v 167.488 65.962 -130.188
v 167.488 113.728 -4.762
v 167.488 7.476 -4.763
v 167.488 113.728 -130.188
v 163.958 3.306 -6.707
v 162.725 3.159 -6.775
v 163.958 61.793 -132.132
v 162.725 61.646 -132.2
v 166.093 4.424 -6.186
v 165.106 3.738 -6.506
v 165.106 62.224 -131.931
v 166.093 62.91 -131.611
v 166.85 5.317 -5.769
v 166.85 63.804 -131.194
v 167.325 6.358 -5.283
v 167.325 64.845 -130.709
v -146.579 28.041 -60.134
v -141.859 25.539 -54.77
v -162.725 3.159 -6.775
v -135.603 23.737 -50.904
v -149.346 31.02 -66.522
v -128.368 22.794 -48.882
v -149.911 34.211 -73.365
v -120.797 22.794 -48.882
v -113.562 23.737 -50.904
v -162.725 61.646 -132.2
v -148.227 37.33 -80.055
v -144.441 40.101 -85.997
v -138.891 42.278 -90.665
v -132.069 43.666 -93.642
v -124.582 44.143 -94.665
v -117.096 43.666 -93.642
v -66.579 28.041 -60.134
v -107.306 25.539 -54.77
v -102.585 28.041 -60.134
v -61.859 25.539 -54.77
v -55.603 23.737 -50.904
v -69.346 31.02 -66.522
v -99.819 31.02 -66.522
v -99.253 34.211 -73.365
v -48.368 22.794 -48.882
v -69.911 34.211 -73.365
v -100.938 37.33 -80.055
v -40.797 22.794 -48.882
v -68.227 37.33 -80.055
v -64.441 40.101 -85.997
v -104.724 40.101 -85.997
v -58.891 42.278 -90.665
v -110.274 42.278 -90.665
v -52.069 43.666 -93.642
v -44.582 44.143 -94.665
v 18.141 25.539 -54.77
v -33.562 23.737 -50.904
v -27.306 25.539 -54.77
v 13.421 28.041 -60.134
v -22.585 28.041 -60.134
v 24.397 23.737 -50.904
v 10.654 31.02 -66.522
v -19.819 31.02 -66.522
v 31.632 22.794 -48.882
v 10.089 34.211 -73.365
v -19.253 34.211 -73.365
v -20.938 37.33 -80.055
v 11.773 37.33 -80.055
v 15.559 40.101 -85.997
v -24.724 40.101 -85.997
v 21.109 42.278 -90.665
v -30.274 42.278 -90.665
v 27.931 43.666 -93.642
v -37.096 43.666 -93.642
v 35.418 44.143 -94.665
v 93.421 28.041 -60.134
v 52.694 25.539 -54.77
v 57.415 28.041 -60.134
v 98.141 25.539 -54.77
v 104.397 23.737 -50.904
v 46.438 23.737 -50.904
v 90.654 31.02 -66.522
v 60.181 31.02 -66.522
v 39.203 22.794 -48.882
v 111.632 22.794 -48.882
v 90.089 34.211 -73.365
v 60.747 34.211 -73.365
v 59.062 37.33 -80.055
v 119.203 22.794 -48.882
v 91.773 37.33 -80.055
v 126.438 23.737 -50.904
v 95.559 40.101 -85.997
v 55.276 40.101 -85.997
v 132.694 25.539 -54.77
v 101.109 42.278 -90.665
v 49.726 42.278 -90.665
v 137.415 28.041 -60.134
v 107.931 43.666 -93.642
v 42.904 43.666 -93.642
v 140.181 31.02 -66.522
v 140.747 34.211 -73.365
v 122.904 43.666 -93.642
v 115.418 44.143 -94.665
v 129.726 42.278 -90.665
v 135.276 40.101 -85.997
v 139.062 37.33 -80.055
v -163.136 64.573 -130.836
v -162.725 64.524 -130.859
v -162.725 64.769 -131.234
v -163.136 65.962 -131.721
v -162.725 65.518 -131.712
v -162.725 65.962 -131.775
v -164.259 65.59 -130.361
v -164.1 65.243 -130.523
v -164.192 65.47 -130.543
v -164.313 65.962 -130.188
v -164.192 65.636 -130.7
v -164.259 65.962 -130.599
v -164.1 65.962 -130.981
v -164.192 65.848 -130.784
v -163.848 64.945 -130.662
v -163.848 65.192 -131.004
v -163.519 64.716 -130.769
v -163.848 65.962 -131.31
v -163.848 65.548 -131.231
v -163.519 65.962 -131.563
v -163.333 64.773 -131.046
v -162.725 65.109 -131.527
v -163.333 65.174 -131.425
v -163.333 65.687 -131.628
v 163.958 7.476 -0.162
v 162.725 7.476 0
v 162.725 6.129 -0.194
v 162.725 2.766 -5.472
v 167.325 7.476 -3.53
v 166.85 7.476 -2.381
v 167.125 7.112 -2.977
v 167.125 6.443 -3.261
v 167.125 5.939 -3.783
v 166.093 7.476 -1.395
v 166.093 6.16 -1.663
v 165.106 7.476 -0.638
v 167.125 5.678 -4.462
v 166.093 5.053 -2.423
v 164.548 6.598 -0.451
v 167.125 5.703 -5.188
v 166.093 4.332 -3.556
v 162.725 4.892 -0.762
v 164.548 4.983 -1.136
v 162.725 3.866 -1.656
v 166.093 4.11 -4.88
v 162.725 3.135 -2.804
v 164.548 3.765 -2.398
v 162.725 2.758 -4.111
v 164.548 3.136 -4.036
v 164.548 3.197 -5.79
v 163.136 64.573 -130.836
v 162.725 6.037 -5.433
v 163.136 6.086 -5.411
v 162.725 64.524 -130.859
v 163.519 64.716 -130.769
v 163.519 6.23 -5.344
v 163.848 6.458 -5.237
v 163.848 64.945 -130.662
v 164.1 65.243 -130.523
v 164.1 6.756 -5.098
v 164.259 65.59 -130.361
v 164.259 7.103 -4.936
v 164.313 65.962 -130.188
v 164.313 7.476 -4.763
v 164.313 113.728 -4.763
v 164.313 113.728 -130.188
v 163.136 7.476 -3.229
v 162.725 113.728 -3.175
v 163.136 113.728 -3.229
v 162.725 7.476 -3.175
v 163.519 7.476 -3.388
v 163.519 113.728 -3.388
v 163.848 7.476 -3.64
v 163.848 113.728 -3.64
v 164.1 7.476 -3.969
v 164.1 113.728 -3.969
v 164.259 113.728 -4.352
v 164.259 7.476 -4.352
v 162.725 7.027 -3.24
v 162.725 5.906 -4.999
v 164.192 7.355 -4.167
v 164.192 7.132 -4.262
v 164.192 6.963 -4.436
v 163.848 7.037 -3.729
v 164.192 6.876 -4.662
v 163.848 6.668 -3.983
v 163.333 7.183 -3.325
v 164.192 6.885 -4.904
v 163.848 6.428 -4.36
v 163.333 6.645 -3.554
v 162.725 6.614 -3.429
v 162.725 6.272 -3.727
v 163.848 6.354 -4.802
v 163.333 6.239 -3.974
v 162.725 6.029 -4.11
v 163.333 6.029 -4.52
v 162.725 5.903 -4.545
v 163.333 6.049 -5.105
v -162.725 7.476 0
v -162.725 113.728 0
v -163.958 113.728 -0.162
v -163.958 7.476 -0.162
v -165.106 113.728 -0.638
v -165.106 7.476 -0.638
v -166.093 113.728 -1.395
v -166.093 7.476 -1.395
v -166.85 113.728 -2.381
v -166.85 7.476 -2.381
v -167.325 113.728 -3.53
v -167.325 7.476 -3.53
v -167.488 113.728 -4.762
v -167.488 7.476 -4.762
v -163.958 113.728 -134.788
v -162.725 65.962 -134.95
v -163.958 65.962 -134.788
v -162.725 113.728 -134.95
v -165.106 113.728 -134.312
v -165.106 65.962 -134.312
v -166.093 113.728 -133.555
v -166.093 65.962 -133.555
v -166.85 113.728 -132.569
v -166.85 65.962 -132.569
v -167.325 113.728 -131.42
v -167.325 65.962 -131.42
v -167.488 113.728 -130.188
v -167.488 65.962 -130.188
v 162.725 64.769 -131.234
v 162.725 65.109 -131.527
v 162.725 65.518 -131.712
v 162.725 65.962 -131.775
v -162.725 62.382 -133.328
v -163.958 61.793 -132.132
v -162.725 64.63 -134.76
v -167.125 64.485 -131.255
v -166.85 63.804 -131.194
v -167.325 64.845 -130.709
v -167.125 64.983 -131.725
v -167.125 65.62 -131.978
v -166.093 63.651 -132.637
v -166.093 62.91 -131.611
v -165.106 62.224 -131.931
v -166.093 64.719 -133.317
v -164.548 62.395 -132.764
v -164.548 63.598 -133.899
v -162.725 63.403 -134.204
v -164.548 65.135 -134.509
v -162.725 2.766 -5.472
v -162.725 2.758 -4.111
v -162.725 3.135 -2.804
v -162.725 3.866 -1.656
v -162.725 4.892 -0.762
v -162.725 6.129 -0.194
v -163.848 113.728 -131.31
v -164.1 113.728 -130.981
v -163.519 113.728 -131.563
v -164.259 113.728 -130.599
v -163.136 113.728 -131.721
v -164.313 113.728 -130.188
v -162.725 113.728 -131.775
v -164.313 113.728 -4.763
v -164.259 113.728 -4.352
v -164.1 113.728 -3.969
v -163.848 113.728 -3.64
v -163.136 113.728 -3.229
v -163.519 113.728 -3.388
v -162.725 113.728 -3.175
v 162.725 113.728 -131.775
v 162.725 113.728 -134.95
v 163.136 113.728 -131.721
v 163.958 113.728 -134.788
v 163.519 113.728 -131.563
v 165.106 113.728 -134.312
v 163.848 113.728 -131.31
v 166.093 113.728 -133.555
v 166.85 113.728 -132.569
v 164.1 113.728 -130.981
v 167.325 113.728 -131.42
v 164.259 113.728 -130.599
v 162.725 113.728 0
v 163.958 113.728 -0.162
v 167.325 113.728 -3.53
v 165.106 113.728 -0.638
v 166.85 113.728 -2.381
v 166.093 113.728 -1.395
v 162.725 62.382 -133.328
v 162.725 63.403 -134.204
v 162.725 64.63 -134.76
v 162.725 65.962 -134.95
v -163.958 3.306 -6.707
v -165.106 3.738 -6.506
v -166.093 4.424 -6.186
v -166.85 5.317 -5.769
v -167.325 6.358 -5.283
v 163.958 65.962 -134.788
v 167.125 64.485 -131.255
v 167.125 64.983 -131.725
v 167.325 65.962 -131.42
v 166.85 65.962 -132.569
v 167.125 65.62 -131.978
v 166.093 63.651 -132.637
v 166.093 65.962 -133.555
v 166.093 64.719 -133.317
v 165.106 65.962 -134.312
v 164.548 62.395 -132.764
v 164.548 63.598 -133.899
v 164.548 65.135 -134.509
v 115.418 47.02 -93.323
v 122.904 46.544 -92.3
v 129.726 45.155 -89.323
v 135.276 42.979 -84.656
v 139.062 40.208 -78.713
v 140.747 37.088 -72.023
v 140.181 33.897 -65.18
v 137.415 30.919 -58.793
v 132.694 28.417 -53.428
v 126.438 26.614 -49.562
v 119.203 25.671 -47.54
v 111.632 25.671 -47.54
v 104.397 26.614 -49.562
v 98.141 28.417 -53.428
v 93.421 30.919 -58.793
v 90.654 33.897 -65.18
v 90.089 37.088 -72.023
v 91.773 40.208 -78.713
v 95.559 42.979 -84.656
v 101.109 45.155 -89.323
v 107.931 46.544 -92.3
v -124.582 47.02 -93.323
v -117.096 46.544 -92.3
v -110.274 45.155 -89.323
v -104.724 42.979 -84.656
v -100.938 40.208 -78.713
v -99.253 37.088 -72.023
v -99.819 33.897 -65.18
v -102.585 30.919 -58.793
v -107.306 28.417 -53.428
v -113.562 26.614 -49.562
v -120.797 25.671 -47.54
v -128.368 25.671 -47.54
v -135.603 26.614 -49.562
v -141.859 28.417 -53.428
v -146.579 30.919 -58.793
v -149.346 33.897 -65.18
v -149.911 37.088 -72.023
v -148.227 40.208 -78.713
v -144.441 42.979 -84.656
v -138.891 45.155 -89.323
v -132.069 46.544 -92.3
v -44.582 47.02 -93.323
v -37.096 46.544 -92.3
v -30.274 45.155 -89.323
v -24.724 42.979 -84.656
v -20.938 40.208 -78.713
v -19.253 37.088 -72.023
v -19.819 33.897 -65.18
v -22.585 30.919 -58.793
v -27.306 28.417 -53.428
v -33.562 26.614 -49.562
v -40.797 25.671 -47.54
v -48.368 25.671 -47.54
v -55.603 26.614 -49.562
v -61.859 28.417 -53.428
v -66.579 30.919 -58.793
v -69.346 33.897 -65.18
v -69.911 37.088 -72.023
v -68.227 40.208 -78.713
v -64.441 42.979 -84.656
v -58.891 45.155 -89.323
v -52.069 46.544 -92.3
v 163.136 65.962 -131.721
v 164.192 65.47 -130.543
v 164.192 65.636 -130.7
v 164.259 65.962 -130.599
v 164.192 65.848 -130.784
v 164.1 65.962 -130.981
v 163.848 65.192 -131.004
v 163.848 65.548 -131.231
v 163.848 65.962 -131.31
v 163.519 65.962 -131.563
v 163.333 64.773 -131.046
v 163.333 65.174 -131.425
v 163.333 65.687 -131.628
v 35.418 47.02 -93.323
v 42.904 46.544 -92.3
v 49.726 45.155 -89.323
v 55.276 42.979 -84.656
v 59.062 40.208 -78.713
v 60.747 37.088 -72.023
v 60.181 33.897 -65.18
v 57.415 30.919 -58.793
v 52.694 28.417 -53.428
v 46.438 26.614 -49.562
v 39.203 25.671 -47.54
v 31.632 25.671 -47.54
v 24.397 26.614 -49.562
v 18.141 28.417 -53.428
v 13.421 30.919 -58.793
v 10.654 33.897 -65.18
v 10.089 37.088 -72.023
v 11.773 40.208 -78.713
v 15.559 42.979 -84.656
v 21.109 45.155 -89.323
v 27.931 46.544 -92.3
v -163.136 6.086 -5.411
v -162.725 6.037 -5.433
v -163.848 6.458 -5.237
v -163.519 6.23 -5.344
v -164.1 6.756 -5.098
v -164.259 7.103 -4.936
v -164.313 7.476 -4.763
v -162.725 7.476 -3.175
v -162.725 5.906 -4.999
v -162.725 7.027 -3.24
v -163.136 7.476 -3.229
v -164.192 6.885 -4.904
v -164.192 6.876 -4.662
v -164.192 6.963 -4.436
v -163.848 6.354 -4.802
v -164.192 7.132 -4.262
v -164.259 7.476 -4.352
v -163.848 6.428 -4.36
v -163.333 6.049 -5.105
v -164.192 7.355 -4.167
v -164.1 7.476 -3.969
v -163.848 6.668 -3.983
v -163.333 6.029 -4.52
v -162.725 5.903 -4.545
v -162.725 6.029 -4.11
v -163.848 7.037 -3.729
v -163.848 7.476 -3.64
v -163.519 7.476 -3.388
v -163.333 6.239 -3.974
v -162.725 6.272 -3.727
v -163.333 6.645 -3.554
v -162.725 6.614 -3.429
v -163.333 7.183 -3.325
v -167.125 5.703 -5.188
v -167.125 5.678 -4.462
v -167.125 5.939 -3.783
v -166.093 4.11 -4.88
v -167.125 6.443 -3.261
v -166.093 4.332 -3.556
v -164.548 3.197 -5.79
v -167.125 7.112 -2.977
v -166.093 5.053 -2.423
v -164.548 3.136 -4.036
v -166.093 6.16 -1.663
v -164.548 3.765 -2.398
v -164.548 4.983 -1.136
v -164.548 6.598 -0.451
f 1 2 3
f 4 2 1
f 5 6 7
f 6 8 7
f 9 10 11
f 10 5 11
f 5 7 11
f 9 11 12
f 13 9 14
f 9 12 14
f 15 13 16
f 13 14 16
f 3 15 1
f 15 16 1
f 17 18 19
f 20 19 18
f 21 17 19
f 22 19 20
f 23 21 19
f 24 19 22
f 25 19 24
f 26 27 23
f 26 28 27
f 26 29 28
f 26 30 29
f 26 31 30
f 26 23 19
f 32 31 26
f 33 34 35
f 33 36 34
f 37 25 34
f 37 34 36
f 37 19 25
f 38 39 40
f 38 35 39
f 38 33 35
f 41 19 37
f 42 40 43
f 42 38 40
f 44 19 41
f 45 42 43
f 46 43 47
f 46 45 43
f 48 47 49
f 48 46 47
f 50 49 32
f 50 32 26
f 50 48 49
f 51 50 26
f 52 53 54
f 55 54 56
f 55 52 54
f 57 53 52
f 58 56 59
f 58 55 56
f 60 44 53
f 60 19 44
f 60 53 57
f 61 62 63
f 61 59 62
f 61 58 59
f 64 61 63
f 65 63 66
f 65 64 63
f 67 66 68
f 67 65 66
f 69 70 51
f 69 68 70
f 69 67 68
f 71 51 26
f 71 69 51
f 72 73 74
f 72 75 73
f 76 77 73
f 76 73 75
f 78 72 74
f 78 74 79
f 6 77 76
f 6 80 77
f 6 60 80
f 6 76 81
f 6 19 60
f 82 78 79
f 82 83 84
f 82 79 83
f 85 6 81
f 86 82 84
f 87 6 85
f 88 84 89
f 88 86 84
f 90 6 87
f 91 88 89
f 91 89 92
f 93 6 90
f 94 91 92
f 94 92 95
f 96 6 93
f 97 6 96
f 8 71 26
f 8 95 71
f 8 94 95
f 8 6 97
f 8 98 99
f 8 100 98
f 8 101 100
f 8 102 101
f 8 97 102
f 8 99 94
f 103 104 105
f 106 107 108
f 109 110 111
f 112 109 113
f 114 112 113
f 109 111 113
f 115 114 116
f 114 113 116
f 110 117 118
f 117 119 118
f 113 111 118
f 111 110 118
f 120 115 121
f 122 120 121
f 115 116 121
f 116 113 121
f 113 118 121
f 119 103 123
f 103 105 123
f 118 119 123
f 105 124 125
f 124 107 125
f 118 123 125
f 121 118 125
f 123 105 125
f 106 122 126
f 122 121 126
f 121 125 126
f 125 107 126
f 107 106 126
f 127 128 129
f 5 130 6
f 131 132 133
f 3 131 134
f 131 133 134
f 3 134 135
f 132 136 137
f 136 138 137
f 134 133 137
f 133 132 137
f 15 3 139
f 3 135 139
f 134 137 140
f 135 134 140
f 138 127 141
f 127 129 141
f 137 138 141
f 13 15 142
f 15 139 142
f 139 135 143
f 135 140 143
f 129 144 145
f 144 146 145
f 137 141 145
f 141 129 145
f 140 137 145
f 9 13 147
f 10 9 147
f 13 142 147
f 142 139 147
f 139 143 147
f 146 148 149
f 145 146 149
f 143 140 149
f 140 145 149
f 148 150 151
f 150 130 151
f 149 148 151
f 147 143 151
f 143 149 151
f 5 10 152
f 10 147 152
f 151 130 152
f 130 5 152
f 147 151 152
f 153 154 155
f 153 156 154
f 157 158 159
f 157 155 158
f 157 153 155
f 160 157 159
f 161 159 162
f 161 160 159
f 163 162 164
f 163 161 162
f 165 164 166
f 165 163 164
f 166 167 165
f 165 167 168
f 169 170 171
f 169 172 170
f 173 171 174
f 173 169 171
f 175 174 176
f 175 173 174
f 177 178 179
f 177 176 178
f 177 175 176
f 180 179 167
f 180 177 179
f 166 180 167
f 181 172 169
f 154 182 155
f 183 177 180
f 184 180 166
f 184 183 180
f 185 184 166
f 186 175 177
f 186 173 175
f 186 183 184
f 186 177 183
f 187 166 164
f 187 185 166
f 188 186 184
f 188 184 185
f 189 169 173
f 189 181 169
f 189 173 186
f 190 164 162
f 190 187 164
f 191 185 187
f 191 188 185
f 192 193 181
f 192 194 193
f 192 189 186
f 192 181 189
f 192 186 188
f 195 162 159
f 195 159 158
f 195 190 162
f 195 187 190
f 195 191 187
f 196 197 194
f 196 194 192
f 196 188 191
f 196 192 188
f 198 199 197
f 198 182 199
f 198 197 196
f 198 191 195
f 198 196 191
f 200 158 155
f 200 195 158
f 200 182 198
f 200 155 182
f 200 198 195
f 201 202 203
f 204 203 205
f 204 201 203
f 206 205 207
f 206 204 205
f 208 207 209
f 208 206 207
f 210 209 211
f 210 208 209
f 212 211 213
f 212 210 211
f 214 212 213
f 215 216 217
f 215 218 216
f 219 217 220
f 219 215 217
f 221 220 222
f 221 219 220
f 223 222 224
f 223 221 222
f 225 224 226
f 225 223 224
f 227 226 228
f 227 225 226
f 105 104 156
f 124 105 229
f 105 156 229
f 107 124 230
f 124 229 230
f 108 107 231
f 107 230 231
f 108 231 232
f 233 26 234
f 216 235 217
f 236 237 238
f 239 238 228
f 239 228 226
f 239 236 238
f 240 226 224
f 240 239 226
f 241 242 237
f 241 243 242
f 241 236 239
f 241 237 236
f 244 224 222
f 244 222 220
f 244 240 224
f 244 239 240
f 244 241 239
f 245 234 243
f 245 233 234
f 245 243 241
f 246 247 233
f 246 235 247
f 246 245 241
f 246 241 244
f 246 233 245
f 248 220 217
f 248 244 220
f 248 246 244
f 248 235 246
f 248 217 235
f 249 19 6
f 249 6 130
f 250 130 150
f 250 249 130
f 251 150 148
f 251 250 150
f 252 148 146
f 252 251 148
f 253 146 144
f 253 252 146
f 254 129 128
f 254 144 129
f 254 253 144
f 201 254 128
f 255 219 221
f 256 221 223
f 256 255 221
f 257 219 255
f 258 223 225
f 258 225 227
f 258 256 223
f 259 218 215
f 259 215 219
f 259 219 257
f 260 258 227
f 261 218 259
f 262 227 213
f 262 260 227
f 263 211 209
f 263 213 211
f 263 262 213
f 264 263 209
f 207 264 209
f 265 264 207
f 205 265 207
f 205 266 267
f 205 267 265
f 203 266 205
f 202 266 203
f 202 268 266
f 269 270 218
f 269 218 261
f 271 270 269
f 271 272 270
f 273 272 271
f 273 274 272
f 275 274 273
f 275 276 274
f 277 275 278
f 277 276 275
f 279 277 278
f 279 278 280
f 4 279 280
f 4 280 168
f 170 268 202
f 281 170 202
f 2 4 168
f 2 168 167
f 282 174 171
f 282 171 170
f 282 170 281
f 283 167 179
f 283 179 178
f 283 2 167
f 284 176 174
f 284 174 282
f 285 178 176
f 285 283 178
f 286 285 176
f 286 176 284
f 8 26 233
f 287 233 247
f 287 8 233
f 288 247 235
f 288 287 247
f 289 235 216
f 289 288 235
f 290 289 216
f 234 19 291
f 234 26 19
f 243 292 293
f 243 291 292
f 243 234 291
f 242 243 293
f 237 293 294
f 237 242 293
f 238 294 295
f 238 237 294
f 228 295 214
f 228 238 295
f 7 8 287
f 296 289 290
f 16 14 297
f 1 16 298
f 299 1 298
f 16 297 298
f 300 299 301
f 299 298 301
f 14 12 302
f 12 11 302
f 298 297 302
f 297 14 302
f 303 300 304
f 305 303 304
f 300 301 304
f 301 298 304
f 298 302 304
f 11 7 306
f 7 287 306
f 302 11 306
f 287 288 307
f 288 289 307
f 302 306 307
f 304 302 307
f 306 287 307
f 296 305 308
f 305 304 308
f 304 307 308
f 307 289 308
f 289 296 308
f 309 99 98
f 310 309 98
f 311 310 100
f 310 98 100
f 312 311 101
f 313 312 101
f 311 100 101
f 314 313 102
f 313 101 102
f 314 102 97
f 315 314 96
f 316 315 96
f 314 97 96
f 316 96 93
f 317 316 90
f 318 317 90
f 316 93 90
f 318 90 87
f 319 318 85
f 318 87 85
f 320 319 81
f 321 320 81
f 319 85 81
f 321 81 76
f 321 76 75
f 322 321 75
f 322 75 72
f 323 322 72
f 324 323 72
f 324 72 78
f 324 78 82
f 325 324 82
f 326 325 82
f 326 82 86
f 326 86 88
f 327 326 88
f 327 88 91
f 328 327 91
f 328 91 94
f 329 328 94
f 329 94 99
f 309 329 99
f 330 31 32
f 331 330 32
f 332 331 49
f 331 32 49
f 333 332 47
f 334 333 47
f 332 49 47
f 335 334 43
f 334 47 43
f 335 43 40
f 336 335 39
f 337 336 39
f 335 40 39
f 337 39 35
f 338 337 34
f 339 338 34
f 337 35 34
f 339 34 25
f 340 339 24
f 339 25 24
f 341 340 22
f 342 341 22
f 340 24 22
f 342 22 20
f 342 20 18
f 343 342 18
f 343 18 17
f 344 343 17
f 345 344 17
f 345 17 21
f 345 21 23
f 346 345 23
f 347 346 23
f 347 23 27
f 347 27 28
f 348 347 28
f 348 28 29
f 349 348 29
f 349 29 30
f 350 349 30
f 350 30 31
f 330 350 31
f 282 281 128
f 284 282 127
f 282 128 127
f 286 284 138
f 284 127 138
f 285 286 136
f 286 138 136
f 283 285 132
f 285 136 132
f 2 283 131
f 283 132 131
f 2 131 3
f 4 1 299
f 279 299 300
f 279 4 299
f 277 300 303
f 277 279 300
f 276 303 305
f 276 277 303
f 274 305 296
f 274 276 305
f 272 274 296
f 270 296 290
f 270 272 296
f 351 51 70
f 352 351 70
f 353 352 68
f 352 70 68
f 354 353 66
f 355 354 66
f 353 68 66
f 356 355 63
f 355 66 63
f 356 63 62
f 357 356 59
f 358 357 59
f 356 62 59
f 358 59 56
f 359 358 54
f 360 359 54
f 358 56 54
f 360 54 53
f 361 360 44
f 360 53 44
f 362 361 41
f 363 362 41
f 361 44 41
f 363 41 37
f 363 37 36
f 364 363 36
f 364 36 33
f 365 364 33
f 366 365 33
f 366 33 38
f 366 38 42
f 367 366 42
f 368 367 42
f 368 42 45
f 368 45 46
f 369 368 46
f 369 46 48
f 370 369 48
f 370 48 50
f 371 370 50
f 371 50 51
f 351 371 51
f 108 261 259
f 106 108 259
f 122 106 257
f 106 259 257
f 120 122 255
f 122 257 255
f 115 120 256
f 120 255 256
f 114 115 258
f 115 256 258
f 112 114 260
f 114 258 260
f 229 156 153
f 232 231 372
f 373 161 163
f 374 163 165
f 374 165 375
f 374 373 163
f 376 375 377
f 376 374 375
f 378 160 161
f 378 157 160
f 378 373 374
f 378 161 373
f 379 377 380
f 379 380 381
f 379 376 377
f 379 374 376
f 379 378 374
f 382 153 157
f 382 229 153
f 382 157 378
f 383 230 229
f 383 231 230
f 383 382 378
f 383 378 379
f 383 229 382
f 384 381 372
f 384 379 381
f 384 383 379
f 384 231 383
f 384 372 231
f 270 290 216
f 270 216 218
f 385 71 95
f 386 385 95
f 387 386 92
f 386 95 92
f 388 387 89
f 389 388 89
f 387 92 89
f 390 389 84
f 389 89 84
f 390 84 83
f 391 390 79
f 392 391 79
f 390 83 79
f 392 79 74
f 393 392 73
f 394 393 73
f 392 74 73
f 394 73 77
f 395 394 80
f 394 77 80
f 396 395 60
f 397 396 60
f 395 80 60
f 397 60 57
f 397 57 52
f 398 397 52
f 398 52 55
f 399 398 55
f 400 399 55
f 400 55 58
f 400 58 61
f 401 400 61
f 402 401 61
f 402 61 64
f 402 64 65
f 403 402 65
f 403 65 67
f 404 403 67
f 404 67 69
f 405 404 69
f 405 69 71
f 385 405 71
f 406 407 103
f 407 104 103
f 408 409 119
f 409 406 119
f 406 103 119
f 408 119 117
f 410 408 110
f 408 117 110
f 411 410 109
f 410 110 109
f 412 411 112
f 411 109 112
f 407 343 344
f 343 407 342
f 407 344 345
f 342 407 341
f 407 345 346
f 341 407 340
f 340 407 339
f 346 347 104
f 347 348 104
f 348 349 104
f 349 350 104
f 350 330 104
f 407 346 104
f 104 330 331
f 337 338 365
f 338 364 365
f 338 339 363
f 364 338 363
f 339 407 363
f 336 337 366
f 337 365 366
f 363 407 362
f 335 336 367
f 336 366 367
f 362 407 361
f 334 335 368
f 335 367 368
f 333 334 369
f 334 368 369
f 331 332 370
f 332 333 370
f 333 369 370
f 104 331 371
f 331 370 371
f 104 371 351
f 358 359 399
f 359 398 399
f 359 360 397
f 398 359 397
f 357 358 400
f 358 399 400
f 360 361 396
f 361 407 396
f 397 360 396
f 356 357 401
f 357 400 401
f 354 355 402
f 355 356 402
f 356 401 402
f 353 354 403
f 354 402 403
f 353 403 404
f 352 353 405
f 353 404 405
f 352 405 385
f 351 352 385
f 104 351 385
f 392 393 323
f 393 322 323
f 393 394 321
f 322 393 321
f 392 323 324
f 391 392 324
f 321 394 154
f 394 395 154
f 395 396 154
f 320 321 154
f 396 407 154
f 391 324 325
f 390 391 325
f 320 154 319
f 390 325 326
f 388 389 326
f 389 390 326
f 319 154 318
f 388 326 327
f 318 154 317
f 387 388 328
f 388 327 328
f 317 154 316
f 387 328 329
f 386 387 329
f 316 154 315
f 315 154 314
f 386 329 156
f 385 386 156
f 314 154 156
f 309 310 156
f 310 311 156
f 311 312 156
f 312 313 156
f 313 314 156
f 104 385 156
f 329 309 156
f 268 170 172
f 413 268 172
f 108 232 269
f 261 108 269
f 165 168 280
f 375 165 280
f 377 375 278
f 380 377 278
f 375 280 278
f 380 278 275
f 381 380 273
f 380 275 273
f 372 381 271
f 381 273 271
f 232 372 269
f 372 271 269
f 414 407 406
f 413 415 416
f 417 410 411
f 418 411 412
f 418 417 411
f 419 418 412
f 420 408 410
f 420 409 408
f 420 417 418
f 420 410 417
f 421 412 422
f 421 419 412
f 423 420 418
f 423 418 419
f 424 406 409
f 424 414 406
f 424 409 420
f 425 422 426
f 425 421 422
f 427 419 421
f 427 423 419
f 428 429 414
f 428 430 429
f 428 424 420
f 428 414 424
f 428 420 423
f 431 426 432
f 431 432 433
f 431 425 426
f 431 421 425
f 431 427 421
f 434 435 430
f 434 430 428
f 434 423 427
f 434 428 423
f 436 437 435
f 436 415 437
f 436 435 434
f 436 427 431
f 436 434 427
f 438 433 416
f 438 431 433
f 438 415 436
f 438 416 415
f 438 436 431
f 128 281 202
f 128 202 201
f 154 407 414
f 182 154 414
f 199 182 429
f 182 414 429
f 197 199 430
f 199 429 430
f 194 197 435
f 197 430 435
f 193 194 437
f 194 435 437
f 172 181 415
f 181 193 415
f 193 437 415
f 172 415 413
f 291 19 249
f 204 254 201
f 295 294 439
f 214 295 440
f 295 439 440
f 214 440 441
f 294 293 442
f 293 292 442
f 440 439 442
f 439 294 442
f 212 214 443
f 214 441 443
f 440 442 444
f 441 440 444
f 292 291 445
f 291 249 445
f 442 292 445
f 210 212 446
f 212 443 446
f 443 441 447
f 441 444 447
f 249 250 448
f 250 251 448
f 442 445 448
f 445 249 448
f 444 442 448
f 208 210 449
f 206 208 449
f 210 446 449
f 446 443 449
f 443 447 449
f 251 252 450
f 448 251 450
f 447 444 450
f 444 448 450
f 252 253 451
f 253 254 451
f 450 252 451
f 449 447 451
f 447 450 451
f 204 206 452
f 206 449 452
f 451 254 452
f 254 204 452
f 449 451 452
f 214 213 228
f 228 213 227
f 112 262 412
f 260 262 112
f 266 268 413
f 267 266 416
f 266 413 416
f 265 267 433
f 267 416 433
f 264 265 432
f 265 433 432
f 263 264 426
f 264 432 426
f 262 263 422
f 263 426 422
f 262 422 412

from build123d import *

# Parameters (mm, degrees)
BOSS_EXTRUDE1_DEPTH = 167.4876
FILLET1_R           = 4.7625
SHELL2_T            = -3.175
SKETCH2_R           = 25.4
CUT_EXTRUDE1_DEPTH  = 7.62


with BuildPart() as part:
    # Sketch1 → Boss-Extrude1 (new, symmetric)
    with BuildSketch(Plane(origin=(0, 0, 0), x_dir=(0, 0, -1), z_dir=(1, 0, 0))):
        Polygon((0, 0), (134.9502, 62.92831173), (134.9502, 113.72831173), (0, 113.72831173), align=None)
    extrude(amount=BOSS_EXTRUDE1_DEPTH, both=True)

    # Fillet1
    fillet1_edges = [part.edges().sort_by_distance(p)[0] for p in [
        (167.4876, 56.864155865, 0),
        (167.4876, 31.464155865, -67.4751),
        (167.4876, 88.32831173, -134.9502),
        (-167.4876, 31.464155865, -67.4751),
        (-167.4876, 56.864155865, 0),
        (-167.4876, 88.32831173, -134.9502),
        (0, 62.92831173, -134.9502),
        (0, 0, 0),
    ]]
    fillet(fillet1_edges, radius=FILLET1_R)

    # Shell2
    shell2_openings = [part.faces().sort_by_distance(p)[0] for p in [
        (0, 113.72831173, -67.4751),
    ]]
    offset(amount=SHELL2_T, openings=shell2_openings, kind=Kind.INTERSECTION)

    # Sketch2 → Cut-Extrude1 (cut)
    with BuildSketch(Plane(origin=(0, 0, 0), x_dir=(1, 0, 0), z_dir=(0, -0.9063077870366493, -0.422618261740701))):
        with Locations(Location((-124.5824, -79.05107084, 0), (0, 0, 270))):
            Circle(SKETCH2_R)
        with Locations(Location((-44.5824, -79.05107084, 0), (0, 0, 270))):
            Circle(SKETCH2_R)
        with Locations(Location((35.4176, -79.05107084, 0), (0, 0, 270))):
            Circle(SKETCH2_R)
        with Locations(Location((115.4176, -79.05107084, 0), (0, 0, 270))):
            Circle(SKETCH2_R)
    extrude(amount=-CUT_EXTRUDE1_DEPTH, mode=Mode.SUBTRACT)


solid = part.part
